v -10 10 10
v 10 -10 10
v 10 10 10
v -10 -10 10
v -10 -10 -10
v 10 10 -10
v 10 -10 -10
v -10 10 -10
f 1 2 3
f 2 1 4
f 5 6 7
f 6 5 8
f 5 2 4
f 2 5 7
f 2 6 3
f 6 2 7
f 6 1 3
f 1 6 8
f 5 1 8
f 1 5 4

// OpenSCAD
// SPDX-License-Identifier: CC-BY-NC-SA-4.0
// __NAME__ — single-part project.
// Render: make render P=__NAME__

// use <fans/fans.scad>;   // import libraries as needed

module __IDENT__() {
    cube([20, 20, 20], center = true);
}

__IDENT__();
